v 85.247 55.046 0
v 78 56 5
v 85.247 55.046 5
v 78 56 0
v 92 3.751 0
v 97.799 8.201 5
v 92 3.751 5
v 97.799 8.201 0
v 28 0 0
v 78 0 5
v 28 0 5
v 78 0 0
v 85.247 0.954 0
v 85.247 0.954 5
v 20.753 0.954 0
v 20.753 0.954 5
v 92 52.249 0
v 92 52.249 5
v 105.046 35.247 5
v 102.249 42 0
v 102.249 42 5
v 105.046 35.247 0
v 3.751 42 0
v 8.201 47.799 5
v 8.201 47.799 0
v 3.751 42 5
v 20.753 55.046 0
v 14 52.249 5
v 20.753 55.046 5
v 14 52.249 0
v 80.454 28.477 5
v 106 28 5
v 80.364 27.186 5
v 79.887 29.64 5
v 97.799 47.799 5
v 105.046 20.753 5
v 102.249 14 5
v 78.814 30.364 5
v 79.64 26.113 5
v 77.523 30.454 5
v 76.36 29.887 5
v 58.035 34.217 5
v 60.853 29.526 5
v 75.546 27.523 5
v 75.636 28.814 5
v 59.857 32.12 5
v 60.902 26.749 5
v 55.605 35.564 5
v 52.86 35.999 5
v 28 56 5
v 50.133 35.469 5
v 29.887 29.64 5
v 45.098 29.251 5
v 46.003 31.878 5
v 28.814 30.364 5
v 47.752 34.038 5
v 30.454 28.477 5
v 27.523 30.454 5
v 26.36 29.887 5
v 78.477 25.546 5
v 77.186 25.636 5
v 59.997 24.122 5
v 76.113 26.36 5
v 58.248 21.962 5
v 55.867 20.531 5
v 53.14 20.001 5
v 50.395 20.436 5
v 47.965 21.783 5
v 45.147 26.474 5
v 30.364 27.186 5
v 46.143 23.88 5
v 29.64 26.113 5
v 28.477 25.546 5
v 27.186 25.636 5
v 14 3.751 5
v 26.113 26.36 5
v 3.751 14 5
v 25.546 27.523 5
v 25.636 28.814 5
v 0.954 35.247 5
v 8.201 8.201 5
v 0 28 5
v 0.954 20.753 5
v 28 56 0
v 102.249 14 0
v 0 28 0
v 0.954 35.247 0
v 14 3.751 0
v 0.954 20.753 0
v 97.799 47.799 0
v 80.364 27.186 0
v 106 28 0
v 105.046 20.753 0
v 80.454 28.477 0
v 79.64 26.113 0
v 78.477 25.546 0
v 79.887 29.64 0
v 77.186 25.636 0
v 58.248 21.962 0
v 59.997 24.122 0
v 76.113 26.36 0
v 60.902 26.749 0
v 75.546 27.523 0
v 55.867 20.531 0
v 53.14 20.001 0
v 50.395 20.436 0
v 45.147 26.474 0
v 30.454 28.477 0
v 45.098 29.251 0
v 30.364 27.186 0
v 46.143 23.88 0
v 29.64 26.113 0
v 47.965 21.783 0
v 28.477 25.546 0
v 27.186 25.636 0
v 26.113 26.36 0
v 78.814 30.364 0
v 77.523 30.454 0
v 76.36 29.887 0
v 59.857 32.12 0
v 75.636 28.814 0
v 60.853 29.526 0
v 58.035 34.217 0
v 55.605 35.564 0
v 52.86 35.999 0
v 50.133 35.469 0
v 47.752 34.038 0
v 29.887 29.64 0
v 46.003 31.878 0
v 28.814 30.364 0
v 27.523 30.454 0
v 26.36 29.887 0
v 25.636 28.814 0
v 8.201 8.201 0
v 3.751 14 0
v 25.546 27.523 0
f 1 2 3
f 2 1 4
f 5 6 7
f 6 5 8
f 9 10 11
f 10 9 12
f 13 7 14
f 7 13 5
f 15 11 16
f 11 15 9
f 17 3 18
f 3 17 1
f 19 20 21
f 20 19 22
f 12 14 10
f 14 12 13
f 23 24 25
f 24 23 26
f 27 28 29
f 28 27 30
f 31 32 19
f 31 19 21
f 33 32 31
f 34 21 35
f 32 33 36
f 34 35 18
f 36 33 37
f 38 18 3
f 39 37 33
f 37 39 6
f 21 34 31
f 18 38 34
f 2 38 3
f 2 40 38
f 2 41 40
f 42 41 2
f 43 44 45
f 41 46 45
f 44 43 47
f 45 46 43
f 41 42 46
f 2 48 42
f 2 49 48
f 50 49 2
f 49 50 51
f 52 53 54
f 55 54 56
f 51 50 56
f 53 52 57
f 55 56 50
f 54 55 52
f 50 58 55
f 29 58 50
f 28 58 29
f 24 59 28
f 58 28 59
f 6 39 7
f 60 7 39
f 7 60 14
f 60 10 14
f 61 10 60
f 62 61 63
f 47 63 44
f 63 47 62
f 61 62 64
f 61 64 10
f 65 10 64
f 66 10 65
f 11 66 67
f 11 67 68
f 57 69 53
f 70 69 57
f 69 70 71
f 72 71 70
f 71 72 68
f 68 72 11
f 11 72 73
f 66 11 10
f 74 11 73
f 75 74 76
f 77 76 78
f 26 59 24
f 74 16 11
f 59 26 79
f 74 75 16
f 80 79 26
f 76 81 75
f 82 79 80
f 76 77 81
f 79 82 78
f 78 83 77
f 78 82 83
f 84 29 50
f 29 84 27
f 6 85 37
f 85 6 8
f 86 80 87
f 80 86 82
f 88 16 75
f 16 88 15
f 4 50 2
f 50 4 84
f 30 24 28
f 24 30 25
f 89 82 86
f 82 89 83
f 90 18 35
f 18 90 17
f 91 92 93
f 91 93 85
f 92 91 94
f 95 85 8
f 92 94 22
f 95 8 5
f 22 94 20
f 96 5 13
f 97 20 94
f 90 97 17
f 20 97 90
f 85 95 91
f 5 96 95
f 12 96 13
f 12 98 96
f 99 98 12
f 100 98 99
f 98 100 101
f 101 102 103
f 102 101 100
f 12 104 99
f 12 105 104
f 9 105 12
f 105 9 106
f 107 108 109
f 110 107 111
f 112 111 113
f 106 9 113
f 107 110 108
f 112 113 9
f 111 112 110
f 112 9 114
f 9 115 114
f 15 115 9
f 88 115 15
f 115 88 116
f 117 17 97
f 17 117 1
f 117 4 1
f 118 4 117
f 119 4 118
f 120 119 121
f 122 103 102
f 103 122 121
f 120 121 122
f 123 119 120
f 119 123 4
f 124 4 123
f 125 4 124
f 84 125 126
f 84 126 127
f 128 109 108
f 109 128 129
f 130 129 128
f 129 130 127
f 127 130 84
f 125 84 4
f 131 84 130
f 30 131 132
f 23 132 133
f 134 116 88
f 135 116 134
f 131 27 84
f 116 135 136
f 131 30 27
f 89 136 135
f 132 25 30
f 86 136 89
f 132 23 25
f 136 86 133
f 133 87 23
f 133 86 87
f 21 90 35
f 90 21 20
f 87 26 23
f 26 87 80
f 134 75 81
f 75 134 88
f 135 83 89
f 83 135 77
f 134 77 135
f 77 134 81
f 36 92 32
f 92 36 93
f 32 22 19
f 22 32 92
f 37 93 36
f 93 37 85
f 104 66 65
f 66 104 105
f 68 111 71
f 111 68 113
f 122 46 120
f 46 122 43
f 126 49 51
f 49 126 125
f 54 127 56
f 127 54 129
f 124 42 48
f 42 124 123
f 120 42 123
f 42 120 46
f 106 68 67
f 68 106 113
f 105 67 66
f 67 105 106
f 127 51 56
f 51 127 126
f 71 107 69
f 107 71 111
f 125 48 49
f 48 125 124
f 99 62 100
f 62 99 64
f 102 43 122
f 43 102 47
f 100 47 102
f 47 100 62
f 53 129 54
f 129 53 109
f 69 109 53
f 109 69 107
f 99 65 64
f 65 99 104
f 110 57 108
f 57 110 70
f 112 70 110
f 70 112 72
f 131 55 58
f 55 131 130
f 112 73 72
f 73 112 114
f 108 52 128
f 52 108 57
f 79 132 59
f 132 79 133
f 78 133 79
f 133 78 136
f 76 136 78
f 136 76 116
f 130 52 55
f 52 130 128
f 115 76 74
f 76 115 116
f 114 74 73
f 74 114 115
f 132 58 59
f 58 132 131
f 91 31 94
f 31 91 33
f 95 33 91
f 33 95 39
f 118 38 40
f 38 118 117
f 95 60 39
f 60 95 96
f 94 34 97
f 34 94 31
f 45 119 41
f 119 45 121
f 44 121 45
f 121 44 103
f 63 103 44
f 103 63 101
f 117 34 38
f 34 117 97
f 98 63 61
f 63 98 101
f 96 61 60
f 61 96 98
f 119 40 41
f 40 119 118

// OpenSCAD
$fn = 32;

// ----------------------------------------------------------------------
// Spacer plate: obround span 50, caps R28
// ----------------------------------------------------------------------

// --- parameters (mm) ---
bore_r = 8;               // centre bore radius
bolt_r = 2.5;             // bolt hole radius
plate_t = 5;              // plate thickness, Z (extrusion height)
span = 50;                // obround span
cap_r = 28;               // cap radius
fit_tol = 0.02;           // declared fit tolerance (prompt contract)
free_tol = 0.2;           // declared free tolerance (prompt contract)

profile = [[28, 56], [20.753, 55.046], [14, 52.249], [8.201, 47.799], [3.751, 42], [0.954, 35.247], [0, 28], [0.954, 20.753], [3.751, 14], [8.201, 8.201], [14, 3.751], [20.753, 0.954], [28, 0], [78, 0], [85.247, 0.954], [92, 3.751], [97.799, 8.201], [102.249, 14], [105.046, 20.753], [106, 28], [105.046, 35.247], [102.249, 42], [97.799, 47.799], [92, 52.249], [85.247, 55.046], [78, 56]];  // primary outline, 26 points, counter clockwise
void_1 = [[60.853, 29.526], [59.857, 32.12], [58.035, 34.217], [55.605, 35.564], [52.86, 35.999], [50.133, 35.469], [47.752, 34.038], [46.003, 31.878], [45.098, 29.251], [45.147, 26.474], [46.143, 23.88], [47.965, 21.783], [50.395, 20.436], [53.14, 20.001], [55.867, 20.531], [58.248, 21.962], [59.997, 24.122], [60.902, 26.749]];  // centre bore, 18 points
void_2 = [[30.454, 28.477], [29.887, 29.64], [28.814, 30.364], [27.523, 30.454], [26.36, 29.887], [25.636, 28.814], [25.546, 27.523], [26.113, 26.36], [27.186, 25.636], [28.477, 25.546], [29.64, 26.113], [30.364, 27.186]];  // end hole, 12 points
void_3 = [[80.454, 28.477], [79.887, 29.64], [78.814, 30.364], [77.523, 30.454], [76.36, 29.887], [75.636, 28.814], [75.546, 27.523], [76.113, 26.36], [77.186, 25.636], [78.477, 25.546], [79.64, 26.113], [80.364, 27.186]];  // end hole, 12 points

// --- the one profile operation ---
difference() {
  linear_extrude(height = plate_t) polygon(points = profile);
  translate([0, 0, -1])
    linear_extrude(height = plate_t + 2) polygon(points = void_1);
  translate([0, 0, -1])
    linear_extrude(height = plate_t + 2) polygon(points = void_2);
  translate([0, 0, -1])
    linear_extrude(height = plate_t + 2) polygon(points = void_3);
}
